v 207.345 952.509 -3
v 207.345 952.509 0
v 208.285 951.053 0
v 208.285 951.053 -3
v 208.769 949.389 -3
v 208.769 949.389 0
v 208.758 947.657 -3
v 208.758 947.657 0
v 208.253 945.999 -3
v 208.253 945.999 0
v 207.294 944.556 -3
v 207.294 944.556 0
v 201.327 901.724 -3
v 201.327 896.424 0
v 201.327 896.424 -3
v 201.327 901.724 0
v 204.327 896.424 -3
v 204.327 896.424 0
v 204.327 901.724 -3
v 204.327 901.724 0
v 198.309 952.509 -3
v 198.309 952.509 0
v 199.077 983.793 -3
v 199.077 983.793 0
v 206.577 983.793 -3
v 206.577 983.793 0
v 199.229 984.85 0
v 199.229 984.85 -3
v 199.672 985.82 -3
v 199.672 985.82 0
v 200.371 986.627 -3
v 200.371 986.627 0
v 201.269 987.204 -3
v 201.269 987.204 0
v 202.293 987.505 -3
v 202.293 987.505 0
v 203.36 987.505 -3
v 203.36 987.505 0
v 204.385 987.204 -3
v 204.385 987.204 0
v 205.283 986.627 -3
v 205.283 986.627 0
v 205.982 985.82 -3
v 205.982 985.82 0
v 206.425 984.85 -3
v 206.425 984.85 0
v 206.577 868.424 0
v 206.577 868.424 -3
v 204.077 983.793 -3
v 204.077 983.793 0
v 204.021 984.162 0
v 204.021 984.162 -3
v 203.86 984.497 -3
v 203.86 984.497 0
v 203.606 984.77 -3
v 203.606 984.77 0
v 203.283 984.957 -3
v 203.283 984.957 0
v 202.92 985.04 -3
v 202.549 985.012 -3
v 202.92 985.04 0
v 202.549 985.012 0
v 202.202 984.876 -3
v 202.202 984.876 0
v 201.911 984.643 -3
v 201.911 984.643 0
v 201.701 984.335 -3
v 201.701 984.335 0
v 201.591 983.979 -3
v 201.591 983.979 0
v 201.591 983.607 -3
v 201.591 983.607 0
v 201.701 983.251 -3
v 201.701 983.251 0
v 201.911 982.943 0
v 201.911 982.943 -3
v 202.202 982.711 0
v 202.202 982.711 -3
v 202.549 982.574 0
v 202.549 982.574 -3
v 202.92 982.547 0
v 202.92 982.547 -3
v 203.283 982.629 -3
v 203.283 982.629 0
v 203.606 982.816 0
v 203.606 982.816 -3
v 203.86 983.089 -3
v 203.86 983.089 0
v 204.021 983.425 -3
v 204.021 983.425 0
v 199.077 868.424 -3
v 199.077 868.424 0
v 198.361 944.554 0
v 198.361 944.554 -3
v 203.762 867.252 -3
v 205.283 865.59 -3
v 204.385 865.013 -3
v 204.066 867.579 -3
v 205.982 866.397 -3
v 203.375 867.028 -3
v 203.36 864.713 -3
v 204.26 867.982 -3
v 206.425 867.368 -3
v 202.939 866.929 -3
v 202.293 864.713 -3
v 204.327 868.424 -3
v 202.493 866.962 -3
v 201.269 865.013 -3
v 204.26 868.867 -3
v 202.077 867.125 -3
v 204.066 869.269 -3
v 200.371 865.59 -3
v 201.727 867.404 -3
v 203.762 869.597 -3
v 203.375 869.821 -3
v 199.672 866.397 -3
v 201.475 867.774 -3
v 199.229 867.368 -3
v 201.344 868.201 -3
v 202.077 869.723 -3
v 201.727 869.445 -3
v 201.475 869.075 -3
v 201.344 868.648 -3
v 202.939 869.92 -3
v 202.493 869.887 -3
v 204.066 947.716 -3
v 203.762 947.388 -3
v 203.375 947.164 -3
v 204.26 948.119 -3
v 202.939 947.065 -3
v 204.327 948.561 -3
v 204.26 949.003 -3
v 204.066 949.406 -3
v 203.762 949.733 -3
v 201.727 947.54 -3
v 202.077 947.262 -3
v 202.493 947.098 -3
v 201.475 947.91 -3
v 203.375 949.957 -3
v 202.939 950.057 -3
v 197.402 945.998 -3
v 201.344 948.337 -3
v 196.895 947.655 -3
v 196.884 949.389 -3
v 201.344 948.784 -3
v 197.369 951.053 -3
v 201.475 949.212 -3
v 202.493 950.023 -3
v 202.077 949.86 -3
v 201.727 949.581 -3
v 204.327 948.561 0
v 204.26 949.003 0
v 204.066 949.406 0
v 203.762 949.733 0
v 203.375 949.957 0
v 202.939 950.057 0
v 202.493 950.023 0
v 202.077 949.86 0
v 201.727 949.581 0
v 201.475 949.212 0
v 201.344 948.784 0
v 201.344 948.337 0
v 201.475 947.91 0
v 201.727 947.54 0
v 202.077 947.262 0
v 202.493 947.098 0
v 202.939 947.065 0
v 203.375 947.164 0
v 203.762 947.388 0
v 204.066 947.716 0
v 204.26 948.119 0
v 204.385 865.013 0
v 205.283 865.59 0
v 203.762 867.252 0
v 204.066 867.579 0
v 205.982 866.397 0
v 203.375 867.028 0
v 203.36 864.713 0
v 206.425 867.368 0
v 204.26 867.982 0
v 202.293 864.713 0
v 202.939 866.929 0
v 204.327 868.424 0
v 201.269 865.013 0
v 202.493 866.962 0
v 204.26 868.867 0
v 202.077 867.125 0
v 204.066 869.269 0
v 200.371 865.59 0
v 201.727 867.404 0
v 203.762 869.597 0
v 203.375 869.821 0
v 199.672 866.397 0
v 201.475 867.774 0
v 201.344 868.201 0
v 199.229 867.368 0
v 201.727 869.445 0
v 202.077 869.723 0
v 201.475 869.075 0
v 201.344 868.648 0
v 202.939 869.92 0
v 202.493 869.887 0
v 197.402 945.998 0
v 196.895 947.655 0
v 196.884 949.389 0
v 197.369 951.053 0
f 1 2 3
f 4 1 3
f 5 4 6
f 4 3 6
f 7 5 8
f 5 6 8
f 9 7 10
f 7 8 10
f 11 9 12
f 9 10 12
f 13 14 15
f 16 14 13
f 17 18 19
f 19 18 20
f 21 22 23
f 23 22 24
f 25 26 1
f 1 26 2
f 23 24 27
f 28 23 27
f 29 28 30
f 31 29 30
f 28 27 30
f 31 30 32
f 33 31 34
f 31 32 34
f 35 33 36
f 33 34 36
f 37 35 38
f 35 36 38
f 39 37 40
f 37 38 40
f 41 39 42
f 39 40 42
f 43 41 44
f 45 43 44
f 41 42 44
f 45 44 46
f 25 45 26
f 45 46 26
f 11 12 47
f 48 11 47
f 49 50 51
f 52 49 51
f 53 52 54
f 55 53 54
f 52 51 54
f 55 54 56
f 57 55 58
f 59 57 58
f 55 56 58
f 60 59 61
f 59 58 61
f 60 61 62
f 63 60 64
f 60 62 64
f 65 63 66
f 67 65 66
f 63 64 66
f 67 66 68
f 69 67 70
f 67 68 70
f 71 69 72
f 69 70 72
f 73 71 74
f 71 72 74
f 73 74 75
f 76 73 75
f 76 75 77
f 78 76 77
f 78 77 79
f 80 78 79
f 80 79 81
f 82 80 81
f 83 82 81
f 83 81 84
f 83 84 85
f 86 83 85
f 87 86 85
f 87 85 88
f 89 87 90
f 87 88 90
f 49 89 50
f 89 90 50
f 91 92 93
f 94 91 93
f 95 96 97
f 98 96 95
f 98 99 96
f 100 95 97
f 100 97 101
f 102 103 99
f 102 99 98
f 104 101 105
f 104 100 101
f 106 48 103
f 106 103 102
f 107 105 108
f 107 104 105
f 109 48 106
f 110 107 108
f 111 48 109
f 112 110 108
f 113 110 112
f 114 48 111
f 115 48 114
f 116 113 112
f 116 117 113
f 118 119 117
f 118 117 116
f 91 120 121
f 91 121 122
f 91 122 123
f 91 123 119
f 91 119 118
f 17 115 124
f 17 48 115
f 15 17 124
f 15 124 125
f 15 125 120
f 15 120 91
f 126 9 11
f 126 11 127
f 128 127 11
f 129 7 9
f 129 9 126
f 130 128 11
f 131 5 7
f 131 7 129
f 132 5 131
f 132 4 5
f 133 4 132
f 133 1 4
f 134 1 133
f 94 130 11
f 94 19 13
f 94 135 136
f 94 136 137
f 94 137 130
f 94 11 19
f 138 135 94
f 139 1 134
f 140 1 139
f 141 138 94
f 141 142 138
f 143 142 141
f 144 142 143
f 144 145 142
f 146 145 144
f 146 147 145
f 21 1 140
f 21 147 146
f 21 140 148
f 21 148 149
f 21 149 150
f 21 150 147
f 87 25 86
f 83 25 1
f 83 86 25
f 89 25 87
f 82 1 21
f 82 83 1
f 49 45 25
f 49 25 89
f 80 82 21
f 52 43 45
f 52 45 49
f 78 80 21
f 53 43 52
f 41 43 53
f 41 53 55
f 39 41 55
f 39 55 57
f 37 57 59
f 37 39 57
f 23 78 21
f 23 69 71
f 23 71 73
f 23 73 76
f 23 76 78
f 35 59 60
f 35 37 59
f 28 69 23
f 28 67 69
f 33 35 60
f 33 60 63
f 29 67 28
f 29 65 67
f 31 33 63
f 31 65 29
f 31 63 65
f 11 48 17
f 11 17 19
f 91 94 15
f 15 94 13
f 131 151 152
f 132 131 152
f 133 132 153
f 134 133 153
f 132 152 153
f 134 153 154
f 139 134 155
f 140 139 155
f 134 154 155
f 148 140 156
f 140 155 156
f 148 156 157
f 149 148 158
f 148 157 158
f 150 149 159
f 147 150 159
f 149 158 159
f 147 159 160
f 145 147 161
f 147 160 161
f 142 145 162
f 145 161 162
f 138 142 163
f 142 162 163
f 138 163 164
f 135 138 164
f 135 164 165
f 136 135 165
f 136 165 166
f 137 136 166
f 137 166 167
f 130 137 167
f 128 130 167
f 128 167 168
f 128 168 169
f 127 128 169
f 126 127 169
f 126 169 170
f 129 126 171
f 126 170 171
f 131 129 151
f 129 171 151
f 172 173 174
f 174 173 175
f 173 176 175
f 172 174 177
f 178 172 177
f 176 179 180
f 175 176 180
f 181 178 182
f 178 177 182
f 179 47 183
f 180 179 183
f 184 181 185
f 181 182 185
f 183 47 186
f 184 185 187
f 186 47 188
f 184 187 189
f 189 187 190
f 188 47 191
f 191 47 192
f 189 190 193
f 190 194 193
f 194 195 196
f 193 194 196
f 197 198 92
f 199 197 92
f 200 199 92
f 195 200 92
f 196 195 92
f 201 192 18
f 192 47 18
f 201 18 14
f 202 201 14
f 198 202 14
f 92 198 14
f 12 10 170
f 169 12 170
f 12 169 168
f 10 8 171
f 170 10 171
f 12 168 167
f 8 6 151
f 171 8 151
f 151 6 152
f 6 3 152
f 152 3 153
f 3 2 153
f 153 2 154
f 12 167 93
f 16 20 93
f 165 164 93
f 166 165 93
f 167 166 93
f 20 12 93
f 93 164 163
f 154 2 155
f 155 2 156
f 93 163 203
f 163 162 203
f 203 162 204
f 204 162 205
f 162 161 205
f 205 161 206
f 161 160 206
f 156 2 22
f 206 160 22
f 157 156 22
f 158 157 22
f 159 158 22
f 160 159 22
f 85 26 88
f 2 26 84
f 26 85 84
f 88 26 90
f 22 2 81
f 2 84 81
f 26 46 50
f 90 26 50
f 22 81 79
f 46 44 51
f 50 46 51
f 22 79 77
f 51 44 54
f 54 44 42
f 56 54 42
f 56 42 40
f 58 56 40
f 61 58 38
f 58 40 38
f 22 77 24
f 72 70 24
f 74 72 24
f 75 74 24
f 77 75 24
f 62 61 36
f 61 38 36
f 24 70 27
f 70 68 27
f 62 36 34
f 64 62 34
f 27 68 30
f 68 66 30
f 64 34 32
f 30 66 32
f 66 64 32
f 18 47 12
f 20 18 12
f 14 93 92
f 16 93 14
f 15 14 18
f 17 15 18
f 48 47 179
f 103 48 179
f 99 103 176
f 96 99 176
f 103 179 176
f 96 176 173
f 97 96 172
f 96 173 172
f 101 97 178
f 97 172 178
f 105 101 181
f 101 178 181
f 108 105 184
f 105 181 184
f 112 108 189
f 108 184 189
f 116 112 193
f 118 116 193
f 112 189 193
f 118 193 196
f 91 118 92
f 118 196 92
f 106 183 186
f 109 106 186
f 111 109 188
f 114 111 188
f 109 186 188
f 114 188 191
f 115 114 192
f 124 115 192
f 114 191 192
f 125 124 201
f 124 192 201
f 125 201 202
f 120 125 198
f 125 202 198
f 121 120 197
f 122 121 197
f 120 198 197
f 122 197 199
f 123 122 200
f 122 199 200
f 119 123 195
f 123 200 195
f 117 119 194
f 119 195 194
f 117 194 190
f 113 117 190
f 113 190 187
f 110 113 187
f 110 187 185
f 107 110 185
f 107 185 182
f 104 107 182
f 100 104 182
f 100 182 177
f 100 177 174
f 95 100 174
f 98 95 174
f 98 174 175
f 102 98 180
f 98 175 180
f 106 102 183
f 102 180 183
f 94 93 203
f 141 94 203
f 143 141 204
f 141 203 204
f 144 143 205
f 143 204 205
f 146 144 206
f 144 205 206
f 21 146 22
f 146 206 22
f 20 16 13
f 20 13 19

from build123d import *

# Parameters (mm, degrees)
ESQUISSE1_R               = 1.25
ESQUISSE1_R_2             = 1.5
ESQUISSE1_W               = 3
ESQUISSE1_H               = 5.3
T_LE_DE_BASE_PLI_E1_DEPTH = 3


# Sheet-metal steps are written as plain solids
with BuildPart() as part:
    # Esquisse1 → Tôle de base pliée1 (new body)
    with BuildSketch(Plane.XY):
        with BuildLine():
            Line((198.308869227, 952.508921018), (199.076816888, 983.793056947))
            ThreePointArc((199.076816888, 983.793056947), (202.826816888, 987.543056947), (206.576816888, 983.793056947))
            Line((206.576816888, 983.793056947), (207.344764549, 952.508921018))
            ThreePointArc((207.344764549, 952.508921018), (208.826696387, 948.522711746), (207.294357708, 944.555606441))
            Line((207.294357708, 944.555606441), (206.576816888, 868.424415079))
            ThreePointArc((206.576816888, 868.424415079), (202.826816888, 864.674415079), (199.076816888, 868.424415079))
            Line((199.076816888, 868.424415079), (198.360659982, 944.554063284))
            ThreePointArc((198.360659982, 944.554063284), (196.826944047, 948.521675361), (198.308869227, 952.508921018))
        make_face()
        with Locations((202.826816888, 983.793056947)):
            Circle(ESQUISSE1_R, mode=Mode.SUBTRACT)
        with Locations((202.826816888, 948.560738026)):
            Circle(ESQUISSE1_R_2, mode=Mode.SUBTRACT)
        with Locations((202.826816888, 868.424415079)):
            Circle(ESQUISSE1_R_2, mode=Mode.SUBTRACT)
        with Locations((202.826816888, 899.074415079)):
            Rectangle(ESQUISSE1_W, ESQUISSE1_H, mode=Mode.SUBTRACT)
    extrude(amount=-T_LE_DE_BASE_PLI_E1_DEPTH)


solid = part.part
